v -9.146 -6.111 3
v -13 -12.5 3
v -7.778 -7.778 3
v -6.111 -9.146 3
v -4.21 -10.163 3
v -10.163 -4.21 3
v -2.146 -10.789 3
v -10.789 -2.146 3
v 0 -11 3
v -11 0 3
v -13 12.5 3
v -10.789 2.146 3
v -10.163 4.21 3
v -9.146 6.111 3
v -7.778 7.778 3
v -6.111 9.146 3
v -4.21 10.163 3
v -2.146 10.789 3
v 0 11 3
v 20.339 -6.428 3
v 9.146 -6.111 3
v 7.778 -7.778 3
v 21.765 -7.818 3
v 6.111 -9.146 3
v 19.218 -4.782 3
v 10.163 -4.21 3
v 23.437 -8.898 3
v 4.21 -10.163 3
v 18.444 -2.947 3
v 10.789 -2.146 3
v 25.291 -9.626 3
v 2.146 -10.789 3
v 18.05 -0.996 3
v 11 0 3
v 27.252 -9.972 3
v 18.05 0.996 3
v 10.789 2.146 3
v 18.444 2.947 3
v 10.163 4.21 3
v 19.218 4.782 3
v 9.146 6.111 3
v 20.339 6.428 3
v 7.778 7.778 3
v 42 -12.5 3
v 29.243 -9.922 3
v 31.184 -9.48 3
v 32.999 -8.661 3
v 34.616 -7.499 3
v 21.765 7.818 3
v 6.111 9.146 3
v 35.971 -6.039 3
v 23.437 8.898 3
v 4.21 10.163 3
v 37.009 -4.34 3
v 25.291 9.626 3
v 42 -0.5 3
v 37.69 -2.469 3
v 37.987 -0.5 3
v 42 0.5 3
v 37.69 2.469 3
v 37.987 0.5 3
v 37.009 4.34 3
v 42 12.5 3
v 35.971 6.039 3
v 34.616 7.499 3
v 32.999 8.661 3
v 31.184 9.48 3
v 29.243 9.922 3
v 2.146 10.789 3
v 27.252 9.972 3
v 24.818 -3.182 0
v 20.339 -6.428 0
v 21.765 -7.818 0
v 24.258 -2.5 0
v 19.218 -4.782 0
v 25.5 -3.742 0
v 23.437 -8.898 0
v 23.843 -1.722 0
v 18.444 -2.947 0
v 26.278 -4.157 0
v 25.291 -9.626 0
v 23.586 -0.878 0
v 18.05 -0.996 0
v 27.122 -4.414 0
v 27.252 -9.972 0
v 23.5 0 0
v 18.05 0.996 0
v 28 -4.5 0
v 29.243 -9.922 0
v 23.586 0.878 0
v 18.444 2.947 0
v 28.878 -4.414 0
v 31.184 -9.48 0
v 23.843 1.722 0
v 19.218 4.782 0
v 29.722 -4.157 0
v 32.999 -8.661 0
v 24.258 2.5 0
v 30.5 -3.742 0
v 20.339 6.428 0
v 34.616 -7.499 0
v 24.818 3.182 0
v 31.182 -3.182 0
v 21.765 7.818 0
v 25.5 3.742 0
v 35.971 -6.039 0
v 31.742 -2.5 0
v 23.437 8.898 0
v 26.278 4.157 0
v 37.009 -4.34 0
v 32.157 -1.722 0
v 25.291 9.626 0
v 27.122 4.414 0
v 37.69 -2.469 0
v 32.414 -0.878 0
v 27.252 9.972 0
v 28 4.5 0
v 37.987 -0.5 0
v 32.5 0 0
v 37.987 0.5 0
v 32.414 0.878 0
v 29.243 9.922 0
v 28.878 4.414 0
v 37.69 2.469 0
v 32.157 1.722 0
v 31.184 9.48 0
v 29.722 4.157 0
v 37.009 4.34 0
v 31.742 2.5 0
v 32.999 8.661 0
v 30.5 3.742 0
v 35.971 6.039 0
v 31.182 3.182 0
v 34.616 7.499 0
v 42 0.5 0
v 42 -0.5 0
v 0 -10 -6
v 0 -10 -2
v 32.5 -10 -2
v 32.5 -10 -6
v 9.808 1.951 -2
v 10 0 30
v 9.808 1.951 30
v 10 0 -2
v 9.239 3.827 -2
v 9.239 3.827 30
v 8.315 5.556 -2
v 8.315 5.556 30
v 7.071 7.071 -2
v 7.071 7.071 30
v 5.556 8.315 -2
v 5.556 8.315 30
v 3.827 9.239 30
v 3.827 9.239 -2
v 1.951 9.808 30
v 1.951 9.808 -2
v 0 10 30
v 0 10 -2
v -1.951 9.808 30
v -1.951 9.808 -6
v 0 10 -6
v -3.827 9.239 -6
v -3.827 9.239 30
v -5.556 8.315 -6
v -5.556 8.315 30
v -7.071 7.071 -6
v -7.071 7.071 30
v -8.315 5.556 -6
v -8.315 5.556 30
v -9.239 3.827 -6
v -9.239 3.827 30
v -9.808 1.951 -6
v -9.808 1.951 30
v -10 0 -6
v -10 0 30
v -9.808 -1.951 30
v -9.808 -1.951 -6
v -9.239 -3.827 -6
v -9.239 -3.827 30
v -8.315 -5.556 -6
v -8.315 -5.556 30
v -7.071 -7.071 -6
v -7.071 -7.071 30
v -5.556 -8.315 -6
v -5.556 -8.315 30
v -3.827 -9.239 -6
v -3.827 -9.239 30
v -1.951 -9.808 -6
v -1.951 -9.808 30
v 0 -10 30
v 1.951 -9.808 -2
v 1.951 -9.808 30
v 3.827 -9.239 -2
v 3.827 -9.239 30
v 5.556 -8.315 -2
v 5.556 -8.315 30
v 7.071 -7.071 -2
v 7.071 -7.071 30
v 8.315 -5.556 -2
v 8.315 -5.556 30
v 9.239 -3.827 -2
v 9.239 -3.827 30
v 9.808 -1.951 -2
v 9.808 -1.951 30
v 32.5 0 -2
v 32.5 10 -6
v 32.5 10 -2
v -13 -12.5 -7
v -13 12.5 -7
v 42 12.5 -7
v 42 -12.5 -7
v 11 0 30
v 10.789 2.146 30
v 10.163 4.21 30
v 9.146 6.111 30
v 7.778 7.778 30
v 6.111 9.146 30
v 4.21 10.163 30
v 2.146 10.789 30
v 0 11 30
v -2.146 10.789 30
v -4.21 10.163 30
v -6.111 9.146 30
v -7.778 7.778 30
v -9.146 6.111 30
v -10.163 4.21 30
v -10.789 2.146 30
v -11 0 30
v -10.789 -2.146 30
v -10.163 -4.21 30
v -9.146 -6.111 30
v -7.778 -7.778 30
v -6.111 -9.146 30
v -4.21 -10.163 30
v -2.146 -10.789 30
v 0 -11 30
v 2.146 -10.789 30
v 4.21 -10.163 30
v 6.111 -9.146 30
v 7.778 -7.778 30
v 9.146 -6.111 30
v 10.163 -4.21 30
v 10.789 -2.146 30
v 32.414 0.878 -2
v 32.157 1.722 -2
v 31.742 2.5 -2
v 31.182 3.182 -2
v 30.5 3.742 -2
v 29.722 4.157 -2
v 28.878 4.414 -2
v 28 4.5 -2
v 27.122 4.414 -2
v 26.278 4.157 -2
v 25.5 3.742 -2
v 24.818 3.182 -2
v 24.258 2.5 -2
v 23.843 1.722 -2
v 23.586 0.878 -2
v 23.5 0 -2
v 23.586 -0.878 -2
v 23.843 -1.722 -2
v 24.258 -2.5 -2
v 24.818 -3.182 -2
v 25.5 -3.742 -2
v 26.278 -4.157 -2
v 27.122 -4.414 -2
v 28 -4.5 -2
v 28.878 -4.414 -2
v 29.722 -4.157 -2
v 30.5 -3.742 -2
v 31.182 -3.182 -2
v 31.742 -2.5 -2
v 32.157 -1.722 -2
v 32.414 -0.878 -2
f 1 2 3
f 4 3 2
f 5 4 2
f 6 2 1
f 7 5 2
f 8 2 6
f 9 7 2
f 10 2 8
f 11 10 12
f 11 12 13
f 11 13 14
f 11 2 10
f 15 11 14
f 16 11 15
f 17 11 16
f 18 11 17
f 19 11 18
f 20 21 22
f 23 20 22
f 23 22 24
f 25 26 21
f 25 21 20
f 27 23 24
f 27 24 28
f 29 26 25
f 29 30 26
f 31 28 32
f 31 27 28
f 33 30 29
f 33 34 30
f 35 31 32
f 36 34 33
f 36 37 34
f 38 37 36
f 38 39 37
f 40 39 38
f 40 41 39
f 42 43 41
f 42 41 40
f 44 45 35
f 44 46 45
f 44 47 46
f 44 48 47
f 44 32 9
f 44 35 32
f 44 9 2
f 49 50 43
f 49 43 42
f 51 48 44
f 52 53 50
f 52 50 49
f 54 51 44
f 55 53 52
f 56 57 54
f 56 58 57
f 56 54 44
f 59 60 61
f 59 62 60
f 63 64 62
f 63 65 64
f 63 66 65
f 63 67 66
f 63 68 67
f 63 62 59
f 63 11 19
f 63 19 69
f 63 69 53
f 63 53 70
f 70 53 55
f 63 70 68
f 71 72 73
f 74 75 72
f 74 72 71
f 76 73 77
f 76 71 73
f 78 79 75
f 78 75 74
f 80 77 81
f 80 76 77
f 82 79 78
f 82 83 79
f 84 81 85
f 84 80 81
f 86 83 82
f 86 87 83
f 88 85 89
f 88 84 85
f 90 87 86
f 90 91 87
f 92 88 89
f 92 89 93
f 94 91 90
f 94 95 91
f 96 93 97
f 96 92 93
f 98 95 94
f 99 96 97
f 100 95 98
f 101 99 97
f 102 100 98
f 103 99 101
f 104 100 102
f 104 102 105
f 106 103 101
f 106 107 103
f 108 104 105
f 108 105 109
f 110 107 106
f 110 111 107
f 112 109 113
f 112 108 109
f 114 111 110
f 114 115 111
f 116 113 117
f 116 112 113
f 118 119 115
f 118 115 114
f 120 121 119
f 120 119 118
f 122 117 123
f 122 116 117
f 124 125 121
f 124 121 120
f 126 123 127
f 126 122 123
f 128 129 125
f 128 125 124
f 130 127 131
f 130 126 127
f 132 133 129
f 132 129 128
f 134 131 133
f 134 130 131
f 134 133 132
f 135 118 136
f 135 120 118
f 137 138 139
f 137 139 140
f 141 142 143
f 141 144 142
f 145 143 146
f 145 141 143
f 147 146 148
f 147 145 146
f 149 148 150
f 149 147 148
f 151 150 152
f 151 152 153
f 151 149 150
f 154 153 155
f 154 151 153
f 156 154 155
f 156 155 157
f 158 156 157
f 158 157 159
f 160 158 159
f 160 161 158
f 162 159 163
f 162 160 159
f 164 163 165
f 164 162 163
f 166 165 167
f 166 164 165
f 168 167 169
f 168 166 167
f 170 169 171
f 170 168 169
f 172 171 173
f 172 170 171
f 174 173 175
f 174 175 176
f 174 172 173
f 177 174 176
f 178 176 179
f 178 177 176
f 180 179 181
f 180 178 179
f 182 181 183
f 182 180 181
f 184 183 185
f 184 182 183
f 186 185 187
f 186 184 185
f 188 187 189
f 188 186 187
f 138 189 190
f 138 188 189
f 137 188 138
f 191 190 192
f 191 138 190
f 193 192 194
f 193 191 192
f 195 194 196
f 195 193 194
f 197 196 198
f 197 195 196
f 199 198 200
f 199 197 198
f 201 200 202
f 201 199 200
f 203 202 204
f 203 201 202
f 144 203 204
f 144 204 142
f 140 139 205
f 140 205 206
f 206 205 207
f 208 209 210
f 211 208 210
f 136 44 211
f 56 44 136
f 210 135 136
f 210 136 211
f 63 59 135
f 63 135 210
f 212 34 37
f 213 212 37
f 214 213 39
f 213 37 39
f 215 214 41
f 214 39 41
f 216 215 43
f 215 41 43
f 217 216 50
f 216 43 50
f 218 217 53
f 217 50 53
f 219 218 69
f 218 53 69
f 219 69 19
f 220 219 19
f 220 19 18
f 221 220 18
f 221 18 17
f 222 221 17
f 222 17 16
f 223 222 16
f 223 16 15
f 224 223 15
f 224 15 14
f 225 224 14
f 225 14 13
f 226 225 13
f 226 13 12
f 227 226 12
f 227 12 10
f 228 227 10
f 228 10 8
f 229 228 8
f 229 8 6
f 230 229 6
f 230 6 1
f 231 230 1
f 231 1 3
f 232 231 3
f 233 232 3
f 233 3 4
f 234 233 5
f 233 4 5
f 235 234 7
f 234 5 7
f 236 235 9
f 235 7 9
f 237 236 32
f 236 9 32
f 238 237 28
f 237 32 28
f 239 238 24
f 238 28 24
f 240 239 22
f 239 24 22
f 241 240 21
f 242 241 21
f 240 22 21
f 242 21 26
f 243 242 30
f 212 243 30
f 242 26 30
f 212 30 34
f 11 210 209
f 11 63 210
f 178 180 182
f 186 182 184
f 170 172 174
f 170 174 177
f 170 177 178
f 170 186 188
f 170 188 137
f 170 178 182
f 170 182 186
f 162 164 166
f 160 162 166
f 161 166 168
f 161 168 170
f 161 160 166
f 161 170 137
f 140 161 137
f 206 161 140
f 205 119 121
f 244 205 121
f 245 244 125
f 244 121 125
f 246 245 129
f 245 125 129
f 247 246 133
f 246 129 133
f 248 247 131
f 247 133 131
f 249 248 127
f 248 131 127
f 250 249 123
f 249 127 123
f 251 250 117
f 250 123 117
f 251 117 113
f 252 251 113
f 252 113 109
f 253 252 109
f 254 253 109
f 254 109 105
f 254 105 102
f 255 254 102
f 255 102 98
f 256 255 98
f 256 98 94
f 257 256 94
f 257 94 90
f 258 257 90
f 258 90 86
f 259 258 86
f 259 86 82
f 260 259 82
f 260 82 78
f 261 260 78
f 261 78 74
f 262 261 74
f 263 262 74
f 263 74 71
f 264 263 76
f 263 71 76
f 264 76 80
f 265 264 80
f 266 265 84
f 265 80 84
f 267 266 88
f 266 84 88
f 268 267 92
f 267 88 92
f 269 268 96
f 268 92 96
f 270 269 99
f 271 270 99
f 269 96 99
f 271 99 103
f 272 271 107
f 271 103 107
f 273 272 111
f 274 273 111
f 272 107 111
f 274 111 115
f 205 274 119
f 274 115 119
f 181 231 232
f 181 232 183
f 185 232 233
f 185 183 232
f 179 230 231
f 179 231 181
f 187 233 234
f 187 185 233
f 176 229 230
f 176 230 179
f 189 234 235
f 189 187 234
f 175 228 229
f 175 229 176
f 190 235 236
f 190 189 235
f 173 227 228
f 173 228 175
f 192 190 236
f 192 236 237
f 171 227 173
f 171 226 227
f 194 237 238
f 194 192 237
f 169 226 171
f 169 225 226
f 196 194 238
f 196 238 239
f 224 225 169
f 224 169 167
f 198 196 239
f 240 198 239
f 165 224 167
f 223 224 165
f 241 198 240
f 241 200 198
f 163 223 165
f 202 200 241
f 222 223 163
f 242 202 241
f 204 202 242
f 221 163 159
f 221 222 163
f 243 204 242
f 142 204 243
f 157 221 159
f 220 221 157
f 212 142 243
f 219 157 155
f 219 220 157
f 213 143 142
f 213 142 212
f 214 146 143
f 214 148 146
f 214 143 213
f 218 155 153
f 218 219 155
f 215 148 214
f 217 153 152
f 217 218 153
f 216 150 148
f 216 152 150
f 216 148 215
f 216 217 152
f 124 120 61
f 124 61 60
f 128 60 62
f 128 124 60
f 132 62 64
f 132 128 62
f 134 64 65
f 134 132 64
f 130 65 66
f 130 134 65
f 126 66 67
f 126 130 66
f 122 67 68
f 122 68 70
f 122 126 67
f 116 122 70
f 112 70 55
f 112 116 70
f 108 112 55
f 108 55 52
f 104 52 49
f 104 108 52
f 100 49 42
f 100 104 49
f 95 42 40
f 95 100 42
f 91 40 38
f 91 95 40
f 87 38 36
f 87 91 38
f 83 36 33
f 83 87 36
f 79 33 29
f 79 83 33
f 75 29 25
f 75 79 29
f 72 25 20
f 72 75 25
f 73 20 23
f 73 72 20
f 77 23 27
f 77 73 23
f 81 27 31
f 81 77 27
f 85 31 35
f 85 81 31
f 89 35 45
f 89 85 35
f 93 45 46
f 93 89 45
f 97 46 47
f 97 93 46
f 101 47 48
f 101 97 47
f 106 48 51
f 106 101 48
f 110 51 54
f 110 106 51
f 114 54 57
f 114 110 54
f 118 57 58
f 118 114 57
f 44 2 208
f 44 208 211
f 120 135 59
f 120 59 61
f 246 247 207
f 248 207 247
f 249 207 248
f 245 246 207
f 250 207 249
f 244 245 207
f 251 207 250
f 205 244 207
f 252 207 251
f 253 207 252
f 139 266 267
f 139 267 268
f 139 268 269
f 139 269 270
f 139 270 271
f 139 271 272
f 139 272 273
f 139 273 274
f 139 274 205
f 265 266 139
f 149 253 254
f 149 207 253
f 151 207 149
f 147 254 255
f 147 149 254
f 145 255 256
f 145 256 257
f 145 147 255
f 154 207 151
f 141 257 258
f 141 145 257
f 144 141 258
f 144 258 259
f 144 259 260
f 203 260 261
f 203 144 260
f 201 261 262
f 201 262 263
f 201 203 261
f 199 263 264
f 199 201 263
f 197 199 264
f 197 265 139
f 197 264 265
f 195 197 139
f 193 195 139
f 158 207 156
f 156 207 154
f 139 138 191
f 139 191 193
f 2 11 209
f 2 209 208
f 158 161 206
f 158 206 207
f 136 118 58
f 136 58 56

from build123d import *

# Parameters (mm, degrees)
F0_R          = 11
F0_R_2        = 10
F0_R_3        = 4.5
F1_DEPTH      = 3
F1_DEPTH_BACK = 7
F2_DEPTH      = 3
F3_DEPTH      = 6
F5_DEPTH      = 32.5
F6_DEPTH      = 30


with BuildPart() as f1:
    # F0 (on Top) → F1 (new body, two sides)
    with BuildSketch(Plane.XY) as f1_sk:
        with BuildLine():
            ThreePointArc((37.9874921777, -0.5), (18, 0), (37.9874921777, 0.5))
            Line((37.9874921777, 0.5), (42, 0.5))
            Line((42, 0.5), (42, 12.5))
            Line((42, 12.5), (-13, 12.5))
            Line((-13, 12.5), (-13, -12.5))
            Line((-13, -12.5), (42, -12.5))
            Line((42, -12.5), (42, -0.5))
            Line((42, -0.5), (37.9874921777, -0.5))
        make_face()
        Circle(F0_R, mode=Mode.SUBTRACT)
        Circle(F0_R)
        Circle(F0_R_2, mode=Mode.SUBTRACT)
        with BuildLine():
            ThreePointArc((37.9874921777, -0.5), (37.9968725554, -0.2500782106), (38, 0))
            ThreePointArc((38, 0), (37.9968725554, 0.2500782106), (37.9874921777, 0.5))
            ThreePointArc((37.9874921777, 0.5), (18, 0), (37.9874921777, -0.5))
        make_face()
        with Locations((28, 0)):
            Circle(F0_R_3, mode=Mode.SUBTRACT)
        Circle(F0_R_2)
        with Locations((28, 0)):
            Circle(F0_R_3)
        with BuildLine():
            ThreePointArc((37.9874921777, 0.5), (37.9968725554, 0.2500782106), (38, 0))
            Line((38, 0), (42, 0))
            Line((42, 0), (42, 0.5))
            Line((42, 0.5), (37.9874921777, 0.5))
        make_face()
        with BuildLine():
            Line((42, 0), (38, 0))
            ThreePointArc((38, 0), (37.9968725554, -0.2500782106), (37.9874921777, -0.5))
            Line((37.9874921777, -0.5), (42, -0.5))
            Line((42, -0.5), (42, 0))
        make_face()
    extrude(amount=F1_DEPTH)
    extrude(f1_sk.sketch, amount=-F1_DEPTH_BACK)

    # F0 (on Top) → F2 (cut)
    with BuildSketch(Plane.XY):
        Circle(F0_R_2)
        with BuildLine():
            ThreePointArc((37.9874921777, -0.5), (37.9968725554, -0.2500782106), (38, 0))
            ThreePointArc((38, 0), (37.9968725554, 0.2500782106), (37.9874921777, 0.5))
            ThreePointArc((37.9874921777, 0.5), (18, 0), (37.9874921777, -0.5))
        make_face()
        with Locations((28, 0)):
            Circle(F0_R_3, mode=Mode.SUBTRACT)
        with Locations((28, 0)):
            Circle(F0_R_3)
        with BuildLine():
            Line((42, 0), (38, 0))
            ThreePointArc((38, 0), (37.9968725554, -0.2500782106), (37.9874921777, -0.5))
            Line((37.9874921777, -0.5), (42, -0.5))
            Line((42, -0.5), (42, 0))
        make_face()
        with BuildLine():
            ThreePointArc((37.9874921777, 0.5), (37.9968725554, 0.2500782106), (38, 0))
            Line((38, 0), (42, 0))
            Line((42, 0), (42, 0.5))
            Line((42, 0.5), (37.9874921777, 0.5))
        make_face()
    extrude(amount=F2_DEPTH, mode=Mode.SUBTRACT)

    # F0 (on Top) → F3 (cut)
    with BuildSketch(Plane.XY):
        with Locations((28, 0)):
            Circle(F0_R_3)
        Circle(F0_R_2)
    extrude(amount=-F3_DEPTH, mode=Mode.SUBTRACT)

    # F4 (on Right) → F5 (cut)
    with BuildSketch(Plane.YZ):
        Polygon((10, -5), (10, -2), (-10, -2), (-10, -6), (10, -6), align=None)
    extrude(amount=F5_DEPTH, mode=Mode.SUBTRACT)

    # F0 (on Top) → F6 (join)
    with BuildSketch(Plane.XY):
        Circle(F0_R)
        Circle(F0_R_2, mode=Mode.SUBTRACT)
    extrude(amount=F6_DEPTH)


solid = f1.part
